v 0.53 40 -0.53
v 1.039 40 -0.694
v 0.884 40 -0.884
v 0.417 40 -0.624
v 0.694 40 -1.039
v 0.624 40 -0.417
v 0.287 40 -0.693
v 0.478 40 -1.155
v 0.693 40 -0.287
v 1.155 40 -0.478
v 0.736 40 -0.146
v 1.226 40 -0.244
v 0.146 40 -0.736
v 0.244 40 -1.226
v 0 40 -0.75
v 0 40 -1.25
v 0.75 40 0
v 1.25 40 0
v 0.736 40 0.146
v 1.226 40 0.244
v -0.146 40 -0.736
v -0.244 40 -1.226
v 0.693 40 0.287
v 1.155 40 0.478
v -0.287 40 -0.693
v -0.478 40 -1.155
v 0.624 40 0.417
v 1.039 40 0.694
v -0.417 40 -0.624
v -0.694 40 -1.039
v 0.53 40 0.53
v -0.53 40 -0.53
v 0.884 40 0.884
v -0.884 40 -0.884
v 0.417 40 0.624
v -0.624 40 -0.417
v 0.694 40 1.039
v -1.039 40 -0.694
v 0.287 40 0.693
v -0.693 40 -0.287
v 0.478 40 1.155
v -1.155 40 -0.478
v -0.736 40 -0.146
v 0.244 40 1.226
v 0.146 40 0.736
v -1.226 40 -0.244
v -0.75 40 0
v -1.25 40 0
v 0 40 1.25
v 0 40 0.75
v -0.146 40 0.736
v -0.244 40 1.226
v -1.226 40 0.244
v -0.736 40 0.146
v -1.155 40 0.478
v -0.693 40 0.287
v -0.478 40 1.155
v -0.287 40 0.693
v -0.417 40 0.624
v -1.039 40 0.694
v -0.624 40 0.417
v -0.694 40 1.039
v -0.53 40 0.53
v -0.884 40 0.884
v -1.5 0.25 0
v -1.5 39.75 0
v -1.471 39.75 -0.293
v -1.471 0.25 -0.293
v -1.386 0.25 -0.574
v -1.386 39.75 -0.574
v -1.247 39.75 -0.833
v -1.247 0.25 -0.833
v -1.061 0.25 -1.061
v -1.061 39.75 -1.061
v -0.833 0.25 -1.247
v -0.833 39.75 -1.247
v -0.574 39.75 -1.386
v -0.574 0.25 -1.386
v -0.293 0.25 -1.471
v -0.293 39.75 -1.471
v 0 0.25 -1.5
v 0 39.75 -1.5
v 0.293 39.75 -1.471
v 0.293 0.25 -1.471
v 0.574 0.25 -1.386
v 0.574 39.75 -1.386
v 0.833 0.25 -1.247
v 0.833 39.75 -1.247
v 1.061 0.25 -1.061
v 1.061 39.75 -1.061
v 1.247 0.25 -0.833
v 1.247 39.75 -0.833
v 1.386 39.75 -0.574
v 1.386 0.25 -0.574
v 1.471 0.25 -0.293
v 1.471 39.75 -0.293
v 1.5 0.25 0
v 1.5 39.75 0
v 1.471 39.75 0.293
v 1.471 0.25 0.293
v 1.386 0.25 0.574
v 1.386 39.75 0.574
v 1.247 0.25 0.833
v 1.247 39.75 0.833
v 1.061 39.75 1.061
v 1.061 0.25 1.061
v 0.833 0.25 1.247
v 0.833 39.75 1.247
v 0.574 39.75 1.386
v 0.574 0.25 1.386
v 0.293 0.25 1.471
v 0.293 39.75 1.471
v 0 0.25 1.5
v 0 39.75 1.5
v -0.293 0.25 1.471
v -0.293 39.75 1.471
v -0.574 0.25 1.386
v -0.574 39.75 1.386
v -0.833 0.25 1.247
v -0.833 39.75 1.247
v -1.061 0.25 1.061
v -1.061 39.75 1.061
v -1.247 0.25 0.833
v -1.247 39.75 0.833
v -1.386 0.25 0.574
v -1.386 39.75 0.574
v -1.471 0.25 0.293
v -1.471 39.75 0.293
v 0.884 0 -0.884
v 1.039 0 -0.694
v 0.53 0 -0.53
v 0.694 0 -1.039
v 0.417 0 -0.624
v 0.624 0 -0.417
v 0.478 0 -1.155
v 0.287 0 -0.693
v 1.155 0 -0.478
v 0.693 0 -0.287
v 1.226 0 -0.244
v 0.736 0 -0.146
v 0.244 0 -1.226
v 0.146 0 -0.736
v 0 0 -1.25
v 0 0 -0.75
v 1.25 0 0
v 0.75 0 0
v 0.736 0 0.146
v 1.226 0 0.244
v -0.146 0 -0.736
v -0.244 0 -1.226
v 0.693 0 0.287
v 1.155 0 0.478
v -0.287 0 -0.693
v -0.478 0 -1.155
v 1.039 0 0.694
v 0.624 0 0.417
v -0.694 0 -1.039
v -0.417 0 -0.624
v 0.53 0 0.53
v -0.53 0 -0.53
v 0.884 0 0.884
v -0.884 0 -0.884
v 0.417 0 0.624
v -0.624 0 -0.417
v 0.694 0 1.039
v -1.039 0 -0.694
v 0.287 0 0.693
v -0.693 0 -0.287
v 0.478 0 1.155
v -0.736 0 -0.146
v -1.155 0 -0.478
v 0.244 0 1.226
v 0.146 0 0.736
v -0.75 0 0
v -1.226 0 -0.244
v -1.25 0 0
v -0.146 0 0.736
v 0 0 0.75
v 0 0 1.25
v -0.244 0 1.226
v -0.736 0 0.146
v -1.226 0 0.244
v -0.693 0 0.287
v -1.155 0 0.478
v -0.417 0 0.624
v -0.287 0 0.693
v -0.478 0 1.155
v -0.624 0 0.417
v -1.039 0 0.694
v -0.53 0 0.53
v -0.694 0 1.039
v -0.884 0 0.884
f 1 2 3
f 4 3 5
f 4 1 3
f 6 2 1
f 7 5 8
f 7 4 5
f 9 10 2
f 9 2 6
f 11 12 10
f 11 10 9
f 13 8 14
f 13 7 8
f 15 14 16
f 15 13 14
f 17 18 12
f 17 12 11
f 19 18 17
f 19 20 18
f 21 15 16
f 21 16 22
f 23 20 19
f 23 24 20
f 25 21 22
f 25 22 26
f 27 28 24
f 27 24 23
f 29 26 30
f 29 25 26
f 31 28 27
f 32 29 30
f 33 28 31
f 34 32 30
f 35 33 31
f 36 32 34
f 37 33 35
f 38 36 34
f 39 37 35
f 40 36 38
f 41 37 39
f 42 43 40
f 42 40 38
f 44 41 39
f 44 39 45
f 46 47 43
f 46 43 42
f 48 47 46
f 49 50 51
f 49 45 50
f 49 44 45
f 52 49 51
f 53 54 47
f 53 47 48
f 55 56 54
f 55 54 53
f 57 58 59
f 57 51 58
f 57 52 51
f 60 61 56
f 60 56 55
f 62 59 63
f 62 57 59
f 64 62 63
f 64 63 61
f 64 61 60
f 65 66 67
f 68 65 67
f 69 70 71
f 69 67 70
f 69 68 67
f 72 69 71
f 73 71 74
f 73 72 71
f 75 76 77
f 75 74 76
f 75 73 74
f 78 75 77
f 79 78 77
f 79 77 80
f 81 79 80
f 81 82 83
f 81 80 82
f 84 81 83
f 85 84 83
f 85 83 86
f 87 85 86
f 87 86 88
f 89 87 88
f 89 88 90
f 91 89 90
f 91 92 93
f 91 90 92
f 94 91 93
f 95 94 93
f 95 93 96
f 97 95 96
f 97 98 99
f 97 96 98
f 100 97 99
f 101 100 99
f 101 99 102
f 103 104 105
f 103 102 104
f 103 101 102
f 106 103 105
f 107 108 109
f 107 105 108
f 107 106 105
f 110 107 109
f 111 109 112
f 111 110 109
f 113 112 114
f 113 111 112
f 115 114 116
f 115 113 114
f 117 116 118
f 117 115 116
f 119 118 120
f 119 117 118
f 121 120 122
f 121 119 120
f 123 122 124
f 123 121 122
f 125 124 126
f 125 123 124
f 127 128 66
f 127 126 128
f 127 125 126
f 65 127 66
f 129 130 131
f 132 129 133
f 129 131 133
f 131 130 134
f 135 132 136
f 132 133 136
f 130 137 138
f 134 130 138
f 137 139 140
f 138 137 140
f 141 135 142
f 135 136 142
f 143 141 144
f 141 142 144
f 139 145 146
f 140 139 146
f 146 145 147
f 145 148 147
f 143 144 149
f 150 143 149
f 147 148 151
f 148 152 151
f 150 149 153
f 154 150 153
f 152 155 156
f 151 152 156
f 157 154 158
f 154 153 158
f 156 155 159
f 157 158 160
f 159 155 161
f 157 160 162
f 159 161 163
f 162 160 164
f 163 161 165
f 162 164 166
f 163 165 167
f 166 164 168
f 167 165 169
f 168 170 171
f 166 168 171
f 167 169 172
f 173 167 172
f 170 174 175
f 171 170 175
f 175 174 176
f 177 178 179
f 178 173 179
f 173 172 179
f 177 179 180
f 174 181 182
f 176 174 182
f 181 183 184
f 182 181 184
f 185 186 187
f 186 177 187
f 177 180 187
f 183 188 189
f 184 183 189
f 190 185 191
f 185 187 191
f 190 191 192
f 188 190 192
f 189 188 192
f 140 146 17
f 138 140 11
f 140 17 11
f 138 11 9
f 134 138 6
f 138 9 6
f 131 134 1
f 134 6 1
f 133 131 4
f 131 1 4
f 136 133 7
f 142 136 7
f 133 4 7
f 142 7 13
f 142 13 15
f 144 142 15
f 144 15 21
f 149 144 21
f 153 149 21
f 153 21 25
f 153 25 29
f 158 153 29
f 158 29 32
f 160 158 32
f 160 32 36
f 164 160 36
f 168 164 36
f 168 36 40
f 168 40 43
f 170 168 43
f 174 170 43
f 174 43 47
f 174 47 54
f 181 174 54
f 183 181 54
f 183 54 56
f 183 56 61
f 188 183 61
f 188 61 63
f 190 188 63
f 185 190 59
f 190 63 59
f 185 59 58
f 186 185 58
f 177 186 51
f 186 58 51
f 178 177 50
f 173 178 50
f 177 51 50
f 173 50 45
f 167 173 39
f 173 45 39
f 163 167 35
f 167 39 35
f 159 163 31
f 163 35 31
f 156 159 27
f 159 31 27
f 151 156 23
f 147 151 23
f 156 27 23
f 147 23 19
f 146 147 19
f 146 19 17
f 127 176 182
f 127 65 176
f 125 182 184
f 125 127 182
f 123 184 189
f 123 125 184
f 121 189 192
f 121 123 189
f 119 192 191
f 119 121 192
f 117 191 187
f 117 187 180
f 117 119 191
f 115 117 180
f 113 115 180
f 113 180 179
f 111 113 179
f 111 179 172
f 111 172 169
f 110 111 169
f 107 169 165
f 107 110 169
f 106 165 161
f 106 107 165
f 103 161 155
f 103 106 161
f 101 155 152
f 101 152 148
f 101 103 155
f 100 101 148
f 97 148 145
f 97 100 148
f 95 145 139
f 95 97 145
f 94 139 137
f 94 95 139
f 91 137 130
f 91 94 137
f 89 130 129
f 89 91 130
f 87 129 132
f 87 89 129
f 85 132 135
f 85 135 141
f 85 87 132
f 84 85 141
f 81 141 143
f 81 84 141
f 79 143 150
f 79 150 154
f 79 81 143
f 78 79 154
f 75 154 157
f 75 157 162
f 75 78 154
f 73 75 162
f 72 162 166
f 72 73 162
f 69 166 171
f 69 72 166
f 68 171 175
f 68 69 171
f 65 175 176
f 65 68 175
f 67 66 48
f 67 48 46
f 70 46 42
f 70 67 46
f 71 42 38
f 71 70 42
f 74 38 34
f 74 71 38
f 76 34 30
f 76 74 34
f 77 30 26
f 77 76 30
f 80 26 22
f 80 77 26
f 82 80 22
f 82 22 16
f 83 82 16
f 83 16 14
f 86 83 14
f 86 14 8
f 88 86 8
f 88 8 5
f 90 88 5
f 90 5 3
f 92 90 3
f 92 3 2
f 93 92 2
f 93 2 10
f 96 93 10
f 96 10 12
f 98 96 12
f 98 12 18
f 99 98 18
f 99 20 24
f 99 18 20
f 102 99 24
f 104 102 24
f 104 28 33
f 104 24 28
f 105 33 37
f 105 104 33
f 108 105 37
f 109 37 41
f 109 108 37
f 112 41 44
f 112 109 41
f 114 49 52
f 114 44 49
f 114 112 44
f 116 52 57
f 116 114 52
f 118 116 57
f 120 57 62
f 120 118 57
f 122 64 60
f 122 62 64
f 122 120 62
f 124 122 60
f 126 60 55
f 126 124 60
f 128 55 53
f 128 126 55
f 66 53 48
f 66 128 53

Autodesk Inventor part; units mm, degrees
ref_plane "YZ Plane" through (0, 0, 0) normal (1, 0, 0) x (0, 1, 0)
ref_plane "XZ Plane" through (0, 0, 0) normal (0, 1, 0) x (-1, 0, 0)
ref_plane "XY Plane" through (0, 0, 0) normal (0, 0, 1) x (1, 0, 0)
sketch "Sketch1" plane through (0, 0, 0) normal (0, 1, 0) x (-1, 0, 0)
  circle A0 centre (0, 0) radius 1.5
  dimension "d0" = 3
extrude "Extrusion1" add sketch "Sketch1" along normal blind 40
sketch "Sketch2" plane through (0, 40, 0) normal (0, 1, 0) x (1, 0, 0)
  circle A0 centre (0, 0) radius 0.75
  dimension "d3" = 1.5
extrude "Extrusion2" cut sketch "Sketch2" against normal blind 40
chamfer "Chamfer1" distance 0.25 angle 45 2 edges at (1.5, 40, 0) (1.5, 0, 0)
properties part number "pin_3_40"
